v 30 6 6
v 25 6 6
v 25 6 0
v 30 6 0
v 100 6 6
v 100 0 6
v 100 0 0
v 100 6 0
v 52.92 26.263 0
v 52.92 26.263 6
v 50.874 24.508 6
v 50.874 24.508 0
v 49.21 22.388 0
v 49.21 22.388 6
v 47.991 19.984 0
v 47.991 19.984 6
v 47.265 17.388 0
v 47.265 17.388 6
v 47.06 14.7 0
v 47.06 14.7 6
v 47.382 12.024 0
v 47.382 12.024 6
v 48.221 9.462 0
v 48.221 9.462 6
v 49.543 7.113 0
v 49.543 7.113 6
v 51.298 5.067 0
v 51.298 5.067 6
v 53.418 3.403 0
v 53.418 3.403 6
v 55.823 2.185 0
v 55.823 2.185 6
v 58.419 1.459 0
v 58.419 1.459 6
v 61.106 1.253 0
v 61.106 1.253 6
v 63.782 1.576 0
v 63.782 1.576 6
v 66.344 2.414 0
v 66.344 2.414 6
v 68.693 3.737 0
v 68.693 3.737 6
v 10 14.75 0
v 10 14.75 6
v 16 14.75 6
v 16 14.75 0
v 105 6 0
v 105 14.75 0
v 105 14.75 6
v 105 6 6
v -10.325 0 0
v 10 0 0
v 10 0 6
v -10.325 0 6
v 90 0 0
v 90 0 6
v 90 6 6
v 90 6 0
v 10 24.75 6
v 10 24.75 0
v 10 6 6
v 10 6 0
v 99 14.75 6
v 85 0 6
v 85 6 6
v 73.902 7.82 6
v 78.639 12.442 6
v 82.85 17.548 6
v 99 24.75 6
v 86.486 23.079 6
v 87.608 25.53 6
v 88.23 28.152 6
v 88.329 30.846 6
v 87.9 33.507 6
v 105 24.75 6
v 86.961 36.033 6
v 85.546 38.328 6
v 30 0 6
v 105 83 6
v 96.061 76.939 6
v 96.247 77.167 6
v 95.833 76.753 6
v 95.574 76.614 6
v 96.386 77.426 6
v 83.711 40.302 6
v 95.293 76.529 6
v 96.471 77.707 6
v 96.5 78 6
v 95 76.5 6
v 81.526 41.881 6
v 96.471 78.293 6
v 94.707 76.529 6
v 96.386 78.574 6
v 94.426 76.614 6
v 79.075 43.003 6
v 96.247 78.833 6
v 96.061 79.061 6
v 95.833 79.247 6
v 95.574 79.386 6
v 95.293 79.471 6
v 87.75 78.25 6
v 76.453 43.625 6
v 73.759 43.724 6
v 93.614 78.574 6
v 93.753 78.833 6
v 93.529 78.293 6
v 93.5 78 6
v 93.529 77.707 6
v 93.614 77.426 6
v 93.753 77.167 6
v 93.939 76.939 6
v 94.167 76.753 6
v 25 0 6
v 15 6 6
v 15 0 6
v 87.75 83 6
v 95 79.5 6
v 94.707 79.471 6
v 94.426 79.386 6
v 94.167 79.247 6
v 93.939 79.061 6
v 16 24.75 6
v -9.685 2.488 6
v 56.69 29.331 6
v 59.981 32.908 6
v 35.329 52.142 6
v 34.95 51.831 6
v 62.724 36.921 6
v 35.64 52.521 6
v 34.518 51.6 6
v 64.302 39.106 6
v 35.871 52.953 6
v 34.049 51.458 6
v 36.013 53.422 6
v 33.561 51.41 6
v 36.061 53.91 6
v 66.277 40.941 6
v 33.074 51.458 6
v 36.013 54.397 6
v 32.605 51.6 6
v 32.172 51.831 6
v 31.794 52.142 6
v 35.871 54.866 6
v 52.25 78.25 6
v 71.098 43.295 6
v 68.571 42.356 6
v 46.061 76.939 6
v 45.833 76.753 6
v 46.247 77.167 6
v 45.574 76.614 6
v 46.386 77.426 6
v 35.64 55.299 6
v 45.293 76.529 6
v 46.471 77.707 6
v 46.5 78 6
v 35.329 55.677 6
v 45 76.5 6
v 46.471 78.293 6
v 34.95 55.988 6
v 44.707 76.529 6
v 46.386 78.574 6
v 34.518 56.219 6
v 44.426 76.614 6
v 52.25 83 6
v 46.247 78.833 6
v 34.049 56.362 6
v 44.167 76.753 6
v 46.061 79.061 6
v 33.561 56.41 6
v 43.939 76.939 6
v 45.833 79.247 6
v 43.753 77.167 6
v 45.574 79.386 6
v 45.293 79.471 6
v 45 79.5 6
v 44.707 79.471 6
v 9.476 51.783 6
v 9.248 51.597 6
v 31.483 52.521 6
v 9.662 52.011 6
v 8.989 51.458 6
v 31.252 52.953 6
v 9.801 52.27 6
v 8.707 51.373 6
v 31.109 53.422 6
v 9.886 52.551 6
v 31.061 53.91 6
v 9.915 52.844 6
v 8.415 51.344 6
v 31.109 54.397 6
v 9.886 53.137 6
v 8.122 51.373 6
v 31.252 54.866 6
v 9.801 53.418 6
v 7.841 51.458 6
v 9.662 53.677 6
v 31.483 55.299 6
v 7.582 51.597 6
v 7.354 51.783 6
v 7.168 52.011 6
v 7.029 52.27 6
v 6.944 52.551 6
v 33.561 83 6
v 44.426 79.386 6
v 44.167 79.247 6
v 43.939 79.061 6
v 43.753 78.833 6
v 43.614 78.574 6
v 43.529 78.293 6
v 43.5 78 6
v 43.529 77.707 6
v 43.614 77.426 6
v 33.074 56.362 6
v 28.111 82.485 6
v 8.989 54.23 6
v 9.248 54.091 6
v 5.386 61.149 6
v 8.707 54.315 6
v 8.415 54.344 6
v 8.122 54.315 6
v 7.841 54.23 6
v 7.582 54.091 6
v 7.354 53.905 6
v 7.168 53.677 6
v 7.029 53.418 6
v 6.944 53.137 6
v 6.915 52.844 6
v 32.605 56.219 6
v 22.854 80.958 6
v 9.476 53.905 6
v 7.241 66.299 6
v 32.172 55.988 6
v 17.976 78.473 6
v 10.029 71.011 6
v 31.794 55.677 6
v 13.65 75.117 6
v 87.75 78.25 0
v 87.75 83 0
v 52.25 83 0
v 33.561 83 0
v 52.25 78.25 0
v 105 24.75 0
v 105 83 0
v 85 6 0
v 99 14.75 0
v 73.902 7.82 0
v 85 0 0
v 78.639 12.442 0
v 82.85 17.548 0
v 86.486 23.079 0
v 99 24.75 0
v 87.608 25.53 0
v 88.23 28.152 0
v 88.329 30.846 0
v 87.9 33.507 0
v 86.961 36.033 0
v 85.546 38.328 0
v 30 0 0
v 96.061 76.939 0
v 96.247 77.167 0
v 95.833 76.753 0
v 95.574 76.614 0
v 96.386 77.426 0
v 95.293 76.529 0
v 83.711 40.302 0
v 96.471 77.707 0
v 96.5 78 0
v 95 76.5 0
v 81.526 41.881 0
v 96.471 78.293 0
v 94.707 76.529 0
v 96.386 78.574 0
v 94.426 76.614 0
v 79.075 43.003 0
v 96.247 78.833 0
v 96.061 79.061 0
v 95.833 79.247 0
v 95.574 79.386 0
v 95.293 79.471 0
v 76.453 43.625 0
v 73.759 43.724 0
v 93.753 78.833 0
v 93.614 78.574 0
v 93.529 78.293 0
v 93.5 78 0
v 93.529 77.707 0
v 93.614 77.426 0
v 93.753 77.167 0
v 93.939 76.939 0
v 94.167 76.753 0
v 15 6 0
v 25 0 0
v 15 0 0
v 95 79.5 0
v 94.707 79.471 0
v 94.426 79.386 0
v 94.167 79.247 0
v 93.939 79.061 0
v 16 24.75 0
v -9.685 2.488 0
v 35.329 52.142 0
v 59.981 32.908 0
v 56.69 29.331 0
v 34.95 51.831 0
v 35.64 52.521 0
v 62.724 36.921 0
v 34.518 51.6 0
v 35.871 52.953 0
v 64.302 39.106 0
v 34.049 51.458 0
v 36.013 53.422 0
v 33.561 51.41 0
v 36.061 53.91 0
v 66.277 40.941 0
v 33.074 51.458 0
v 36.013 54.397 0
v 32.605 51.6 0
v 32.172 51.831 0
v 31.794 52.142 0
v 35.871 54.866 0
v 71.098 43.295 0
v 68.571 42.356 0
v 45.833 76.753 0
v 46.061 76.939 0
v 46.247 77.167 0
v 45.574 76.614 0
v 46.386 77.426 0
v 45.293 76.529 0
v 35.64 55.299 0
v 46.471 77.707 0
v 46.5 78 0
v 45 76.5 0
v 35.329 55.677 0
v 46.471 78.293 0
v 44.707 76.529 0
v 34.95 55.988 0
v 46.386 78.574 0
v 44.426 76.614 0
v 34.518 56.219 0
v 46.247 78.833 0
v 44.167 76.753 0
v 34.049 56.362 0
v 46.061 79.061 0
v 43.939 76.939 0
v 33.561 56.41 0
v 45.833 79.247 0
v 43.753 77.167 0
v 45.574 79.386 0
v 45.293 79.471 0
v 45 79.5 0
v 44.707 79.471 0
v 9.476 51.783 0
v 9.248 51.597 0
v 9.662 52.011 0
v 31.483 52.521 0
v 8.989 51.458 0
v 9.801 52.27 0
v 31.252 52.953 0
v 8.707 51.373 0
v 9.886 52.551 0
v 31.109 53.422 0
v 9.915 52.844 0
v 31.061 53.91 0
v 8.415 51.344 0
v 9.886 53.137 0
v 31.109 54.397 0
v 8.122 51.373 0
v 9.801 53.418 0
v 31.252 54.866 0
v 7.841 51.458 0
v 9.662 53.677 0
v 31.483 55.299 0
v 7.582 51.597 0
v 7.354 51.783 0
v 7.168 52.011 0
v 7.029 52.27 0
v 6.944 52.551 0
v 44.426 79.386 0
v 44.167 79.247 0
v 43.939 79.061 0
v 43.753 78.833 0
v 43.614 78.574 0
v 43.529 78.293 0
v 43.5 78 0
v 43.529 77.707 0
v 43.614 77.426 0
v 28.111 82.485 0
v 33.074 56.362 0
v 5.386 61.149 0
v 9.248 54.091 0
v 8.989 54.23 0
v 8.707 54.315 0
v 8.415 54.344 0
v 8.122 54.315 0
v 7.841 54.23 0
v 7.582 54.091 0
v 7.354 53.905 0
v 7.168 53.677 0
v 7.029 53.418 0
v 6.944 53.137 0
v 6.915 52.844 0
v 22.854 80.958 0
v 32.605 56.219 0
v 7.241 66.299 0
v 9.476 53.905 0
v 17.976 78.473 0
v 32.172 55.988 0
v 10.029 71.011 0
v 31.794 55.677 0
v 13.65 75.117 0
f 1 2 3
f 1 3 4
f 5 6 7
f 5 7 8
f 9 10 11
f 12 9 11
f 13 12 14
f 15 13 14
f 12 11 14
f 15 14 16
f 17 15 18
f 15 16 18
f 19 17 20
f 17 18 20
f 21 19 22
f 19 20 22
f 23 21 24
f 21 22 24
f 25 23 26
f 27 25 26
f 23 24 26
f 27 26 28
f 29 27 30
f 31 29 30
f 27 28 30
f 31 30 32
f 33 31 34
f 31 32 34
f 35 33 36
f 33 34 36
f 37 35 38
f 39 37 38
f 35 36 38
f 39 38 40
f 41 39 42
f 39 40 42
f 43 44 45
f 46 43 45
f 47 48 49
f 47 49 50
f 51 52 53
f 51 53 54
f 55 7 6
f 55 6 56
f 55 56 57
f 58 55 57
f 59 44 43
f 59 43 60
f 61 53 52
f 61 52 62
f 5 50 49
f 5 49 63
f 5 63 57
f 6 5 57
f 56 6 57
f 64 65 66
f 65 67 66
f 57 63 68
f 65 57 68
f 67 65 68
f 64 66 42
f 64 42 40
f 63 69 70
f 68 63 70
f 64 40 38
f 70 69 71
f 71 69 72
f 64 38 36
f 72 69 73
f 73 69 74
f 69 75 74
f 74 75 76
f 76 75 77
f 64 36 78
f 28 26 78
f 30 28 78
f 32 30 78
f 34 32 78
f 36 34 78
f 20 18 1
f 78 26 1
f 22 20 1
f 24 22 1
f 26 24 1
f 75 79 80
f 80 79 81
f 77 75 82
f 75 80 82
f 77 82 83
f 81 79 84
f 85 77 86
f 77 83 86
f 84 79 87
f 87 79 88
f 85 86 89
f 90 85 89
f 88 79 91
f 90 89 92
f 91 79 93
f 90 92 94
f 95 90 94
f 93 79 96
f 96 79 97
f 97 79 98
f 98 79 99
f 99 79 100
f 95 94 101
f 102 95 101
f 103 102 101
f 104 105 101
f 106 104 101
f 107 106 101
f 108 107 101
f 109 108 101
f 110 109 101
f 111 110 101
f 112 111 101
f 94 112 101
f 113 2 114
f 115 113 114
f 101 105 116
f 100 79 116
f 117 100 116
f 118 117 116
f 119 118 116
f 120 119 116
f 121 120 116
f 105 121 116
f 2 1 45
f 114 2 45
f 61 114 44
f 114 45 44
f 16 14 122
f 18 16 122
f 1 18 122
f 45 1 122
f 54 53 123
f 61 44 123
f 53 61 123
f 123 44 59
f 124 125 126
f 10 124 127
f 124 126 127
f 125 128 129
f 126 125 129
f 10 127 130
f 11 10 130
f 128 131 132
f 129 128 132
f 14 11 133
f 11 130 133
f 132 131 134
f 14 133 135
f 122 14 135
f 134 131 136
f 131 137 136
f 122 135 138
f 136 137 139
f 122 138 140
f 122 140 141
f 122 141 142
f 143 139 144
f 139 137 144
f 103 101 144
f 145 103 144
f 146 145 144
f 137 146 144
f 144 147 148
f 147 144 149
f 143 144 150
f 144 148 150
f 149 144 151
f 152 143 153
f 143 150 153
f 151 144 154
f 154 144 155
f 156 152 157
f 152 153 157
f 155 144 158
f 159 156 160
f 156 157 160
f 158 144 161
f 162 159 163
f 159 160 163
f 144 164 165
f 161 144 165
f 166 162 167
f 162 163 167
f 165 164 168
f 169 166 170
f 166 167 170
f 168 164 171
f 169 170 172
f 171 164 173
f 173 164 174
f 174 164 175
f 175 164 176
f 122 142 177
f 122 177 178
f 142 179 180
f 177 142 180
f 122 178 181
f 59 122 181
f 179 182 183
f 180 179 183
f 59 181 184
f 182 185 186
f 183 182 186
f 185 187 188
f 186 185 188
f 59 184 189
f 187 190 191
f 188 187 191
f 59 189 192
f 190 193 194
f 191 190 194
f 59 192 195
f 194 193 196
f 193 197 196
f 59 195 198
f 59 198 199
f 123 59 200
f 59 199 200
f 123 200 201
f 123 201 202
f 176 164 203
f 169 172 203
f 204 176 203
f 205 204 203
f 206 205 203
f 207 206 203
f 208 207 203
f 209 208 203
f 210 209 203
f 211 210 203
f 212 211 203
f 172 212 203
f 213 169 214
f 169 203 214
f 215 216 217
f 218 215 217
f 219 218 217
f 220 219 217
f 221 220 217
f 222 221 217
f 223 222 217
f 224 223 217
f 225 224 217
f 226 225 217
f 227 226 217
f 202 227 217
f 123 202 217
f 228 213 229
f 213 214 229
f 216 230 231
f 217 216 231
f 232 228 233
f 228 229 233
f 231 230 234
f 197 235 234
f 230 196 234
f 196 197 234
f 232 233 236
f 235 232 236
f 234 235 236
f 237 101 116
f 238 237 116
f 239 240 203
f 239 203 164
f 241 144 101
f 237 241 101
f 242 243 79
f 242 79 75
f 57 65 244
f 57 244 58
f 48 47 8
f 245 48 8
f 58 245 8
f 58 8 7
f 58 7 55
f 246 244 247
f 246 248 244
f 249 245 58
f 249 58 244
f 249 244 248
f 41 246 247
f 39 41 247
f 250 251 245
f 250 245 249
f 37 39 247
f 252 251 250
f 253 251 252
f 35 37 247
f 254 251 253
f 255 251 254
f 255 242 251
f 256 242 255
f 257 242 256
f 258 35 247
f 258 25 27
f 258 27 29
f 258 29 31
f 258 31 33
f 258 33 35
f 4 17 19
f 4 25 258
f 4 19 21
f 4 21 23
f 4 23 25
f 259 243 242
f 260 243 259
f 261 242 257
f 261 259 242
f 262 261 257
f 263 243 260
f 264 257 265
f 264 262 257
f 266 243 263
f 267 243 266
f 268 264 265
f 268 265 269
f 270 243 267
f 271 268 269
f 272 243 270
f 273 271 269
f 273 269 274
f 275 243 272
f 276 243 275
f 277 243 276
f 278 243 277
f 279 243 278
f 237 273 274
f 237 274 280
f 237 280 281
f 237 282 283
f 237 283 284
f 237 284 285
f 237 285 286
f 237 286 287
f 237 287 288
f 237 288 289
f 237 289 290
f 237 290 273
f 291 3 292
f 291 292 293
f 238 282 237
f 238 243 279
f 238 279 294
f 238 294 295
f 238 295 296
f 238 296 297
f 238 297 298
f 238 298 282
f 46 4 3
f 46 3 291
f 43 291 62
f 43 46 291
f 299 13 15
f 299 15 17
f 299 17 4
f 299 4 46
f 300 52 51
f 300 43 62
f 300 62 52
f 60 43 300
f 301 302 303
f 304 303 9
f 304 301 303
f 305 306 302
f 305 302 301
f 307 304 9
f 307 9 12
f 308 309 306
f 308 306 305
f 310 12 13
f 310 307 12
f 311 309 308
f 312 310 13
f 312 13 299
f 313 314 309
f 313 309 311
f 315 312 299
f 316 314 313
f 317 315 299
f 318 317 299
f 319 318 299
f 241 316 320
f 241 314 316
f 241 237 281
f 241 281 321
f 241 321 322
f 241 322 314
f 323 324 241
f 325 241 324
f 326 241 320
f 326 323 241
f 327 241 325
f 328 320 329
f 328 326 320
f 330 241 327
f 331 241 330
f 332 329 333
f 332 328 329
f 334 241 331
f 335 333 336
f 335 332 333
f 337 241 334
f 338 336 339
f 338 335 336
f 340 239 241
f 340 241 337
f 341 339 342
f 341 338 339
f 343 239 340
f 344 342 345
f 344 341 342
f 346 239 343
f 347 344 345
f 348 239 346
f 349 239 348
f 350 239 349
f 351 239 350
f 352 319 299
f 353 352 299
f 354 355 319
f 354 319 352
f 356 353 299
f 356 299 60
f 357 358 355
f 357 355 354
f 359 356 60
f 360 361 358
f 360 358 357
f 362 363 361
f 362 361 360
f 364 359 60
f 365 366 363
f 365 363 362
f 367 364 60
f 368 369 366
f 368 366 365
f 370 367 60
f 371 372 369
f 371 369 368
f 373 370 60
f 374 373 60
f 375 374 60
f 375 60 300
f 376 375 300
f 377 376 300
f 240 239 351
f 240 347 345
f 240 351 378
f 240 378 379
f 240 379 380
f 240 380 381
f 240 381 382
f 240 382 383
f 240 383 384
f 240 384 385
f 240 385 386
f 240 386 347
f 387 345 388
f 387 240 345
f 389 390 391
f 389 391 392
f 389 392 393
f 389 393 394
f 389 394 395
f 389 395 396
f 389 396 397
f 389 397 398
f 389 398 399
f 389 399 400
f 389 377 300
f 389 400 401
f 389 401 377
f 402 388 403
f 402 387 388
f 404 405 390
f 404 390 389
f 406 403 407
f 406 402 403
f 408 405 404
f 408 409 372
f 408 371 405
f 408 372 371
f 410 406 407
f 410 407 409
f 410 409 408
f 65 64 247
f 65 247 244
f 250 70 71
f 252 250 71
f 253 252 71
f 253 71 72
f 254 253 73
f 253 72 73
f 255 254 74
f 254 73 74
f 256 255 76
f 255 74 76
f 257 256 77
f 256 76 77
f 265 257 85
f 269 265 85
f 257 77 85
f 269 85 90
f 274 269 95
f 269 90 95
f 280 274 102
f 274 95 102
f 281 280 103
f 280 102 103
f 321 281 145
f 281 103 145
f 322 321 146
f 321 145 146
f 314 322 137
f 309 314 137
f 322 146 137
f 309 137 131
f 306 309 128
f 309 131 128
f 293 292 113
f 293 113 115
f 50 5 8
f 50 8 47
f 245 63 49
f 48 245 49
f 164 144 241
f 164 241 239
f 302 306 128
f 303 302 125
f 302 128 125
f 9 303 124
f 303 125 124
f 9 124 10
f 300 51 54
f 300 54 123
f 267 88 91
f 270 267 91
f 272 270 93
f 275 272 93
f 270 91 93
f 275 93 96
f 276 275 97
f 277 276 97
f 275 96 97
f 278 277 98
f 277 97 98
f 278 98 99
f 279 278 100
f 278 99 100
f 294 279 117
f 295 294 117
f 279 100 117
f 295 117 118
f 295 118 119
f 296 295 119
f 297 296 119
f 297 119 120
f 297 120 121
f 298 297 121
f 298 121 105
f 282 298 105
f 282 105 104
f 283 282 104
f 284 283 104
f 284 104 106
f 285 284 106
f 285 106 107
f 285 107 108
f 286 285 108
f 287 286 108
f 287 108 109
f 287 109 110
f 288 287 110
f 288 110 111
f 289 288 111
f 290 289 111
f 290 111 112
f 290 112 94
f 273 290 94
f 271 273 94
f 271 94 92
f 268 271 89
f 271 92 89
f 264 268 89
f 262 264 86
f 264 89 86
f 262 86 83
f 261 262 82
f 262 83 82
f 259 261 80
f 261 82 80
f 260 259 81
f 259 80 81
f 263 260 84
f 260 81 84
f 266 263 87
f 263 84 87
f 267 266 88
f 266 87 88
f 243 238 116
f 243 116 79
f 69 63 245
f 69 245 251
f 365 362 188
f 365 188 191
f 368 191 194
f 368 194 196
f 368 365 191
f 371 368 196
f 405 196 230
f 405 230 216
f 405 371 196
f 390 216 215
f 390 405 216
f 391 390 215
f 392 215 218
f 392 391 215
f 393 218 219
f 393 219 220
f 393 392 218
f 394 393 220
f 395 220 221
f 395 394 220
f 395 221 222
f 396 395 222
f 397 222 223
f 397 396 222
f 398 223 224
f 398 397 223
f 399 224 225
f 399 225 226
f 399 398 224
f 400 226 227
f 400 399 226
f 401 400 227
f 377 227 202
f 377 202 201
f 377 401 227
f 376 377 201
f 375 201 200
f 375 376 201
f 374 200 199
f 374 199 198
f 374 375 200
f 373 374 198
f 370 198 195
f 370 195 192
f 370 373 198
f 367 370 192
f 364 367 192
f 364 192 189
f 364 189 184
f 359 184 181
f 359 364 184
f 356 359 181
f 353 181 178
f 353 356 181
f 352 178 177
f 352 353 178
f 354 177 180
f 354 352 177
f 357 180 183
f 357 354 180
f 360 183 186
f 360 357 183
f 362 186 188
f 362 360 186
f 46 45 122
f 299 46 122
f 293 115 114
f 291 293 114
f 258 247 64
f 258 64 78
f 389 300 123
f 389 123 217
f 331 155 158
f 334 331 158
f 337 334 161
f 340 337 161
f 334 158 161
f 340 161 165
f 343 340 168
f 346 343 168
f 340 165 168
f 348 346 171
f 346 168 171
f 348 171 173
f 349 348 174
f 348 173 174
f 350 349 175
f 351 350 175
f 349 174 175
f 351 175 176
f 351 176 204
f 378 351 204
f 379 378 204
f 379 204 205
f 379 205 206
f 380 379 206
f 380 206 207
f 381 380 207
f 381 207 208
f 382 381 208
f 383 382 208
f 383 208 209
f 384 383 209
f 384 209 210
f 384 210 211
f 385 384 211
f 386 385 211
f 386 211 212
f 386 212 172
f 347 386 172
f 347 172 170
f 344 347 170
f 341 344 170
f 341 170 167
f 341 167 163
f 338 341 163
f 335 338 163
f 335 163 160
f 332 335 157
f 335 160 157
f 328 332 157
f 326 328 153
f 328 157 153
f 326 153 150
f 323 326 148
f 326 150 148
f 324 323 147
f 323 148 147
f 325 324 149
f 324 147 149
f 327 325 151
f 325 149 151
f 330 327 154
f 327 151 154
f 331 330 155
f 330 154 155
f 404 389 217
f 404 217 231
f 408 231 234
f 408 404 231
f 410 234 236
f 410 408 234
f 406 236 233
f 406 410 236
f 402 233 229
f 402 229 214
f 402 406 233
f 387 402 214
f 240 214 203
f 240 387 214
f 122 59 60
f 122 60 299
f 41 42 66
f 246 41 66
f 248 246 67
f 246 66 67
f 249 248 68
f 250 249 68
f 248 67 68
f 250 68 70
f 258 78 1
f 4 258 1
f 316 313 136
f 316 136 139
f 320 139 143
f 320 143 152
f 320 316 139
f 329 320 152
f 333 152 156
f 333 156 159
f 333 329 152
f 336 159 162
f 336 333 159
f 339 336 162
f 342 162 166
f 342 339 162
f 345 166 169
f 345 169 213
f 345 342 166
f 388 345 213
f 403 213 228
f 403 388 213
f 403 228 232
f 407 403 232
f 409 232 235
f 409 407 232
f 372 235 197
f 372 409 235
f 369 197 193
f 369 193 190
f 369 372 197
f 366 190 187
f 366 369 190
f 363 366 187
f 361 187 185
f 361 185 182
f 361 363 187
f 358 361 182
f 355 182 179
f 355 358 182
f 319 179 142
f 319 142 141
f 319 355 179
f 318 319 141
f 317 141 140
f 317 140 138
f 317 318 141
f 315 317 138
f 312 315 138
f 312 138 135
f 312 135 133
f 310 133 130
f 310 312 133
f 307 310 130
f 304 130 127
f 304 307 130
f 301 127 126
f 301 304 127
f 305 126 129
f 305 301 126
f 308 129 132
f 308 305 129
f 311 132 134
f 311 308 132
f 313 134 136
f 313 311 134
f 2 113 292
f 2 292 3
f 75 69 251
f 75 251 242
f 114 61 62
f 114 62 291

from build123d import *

# Parameters (mm, degrees)
SKETCH1_R           = 2.5
BOSS_EXTRUDE1_DEPTH = 6
SKETCH2_W           = 5
SKETCH2_H           = 6
SKETCH2_W_2         = 6
SKETCH2_H_2         = 10
CUT_EXTRUDE1_DEPTH  = 134.97761007
SKETCH3_R           = 1.5
CUT_EXTRUDE2_DEPTH  = 134.97761007
SKETCH4_W           = 35.5
SKETCH4_H           = 4.75
CUT_EXTRUDE3_DEPTH  = 10
CAVITY1_OUTLINE_R   = 1.5
CAVITY1_DEPTH       = 6
CUT_EXTRUDE4_DEPTH  = 134.97761007


# Read off the part's stored shape, not the designer's step: Cavity1
with BuildPart() as part:
    # Sketch1 → Boss-Extrude1 (new body)
    with BuildSketch(Plane.XY):
        with BuildLine():
            Line((-9.685424338, 2.488484559), (5.386220056, 61.148792841))
            ThreePointArc((5.386220056, 61.148792841), (15.733633721, 76.897010412), (33.561388608, 83))
            Line((33.561388608, 83), (105, 83))
            Line((105, 83), (105, 0))
            Line((105, 0), (-10.324792855, 0))
            Line((-10.324792855, 0), (-9.685424338, 2.488484559))
        make_face()
        with Locations((33.561388608, 53.909722104)):
            Circle(SKETCH1_R, mode=Mode.SUBTRACT)
        with BuildLine():
            ThreePointArc((67.975974789, 4.760599446), (77.719162031, 13.288409394), (85.405906554, 23.707967867))
            ThreePointArc((85.405906554, 23.707967867), (80.896997447, 40.800941239), (63.804024076, 36.292032133))
            ThreePointArc((63.804024076, 36.292032133), (59.320089771, 30.213956356), (53.63656388, 25.239400554))
            ThreePointArc((53.63656388, 25.239400554), (50.566868781, 7.830294546), (67.975974789, 4.760599446))
        make_face(mode=Mode.SUBTRACT)
    extrude(amount=BOSS_EXTRUDE1_DEPTH)

    # Sketch2 → Cut-Extrude1 (cut, through all)
    with BuildSketch(Plane.XY.offset(6)):
        with Locations((12.5, 3)):
            Rectangle(SKETCH2_W, SKETCH2_H)
        with Locations((102.5, 3)):
            Rectangle(SKETCH2_W, SKETCH2_H)
        with Locations((27.5, 3)):
            Rectangle(SKETCH2_W, SKETCH2_H)
        with Locations((87.5, 3)):
            Rectangle(SKETCH2_W, SKETCH2_H)
        with Locations((102, 19.75)):
            Rectangle(SKETCH2_W_2, SKETCH2_H_2)
        with Locations((13, 19.75)):
            Rectangle(SKETCH2_W_2, SKETCH2_H_2)
    extrude(amount=-CUT_EXTRUDE1_DEPTH, mode=Mode.SUBTRACT)

    # Sketch3 → Cut-Extrude2 (cut, through all)
    with BuildSketch(Plane.XY.offset(6)):
        with Locations((95, 78)):
            Circle(SKETCH3_R)
        with Locations((45, 78)):
            Circle(SKETCH3_R)
    extrude(amount=-CUT_EXTRUDE2_DEPTH, mode=Mode.SUBTRACT)

    # Sketch4 → Cut-Extrude3 (cut)
    with BuildSketch(Plane.XY.offset(6)):
        with Locations((70, 80.625)):
            Rectangle(SKETCH4_W, SKETCH4_H)
    extrude(amount=-CUT_EXTRUDE3_DEPTH, mode=Mode.SUBTRACT)

    # Cavity1 outline → Cavity1 (cut)
    with BuildSketch(Plane.XY):
        with Locations((8.414860226, 52.844005614)):
            Circle(CAVITY1_OUTLINE_R)
    extrude(amount=CAVITY1_DEPTH, mode=Mode.SUBTRACT)

    # Sketch5 → Cut-Extrude4 (cut, through all)
    with BuildSketch(Plane.XY.offset(6)):
        with BuildLine():
            ThreePointArc((52.919593335, 26.263340609), (49.542928725, 7.113324), (68.692945334, 3.736659391))
            ThreePointArc((68.692945334, 3.736659391), (78.639115644, 12.442132046), (86.486000678, 23.078764654))
            ThreePointArc((86.486000678, 23.078764654), (81.526200661, 41.881035363), (62.723929952, 36.921235346))
            ThreePointArc((62.723929952, 36.921235346), (58.400136158, 31.060233704), (52.919593335, 26.263340609))
        make_face()
    extrude(amount=-CUT_EXTRUDE4_DEPTH, mode=Mode.SUBTRACT)


solid = part.part
